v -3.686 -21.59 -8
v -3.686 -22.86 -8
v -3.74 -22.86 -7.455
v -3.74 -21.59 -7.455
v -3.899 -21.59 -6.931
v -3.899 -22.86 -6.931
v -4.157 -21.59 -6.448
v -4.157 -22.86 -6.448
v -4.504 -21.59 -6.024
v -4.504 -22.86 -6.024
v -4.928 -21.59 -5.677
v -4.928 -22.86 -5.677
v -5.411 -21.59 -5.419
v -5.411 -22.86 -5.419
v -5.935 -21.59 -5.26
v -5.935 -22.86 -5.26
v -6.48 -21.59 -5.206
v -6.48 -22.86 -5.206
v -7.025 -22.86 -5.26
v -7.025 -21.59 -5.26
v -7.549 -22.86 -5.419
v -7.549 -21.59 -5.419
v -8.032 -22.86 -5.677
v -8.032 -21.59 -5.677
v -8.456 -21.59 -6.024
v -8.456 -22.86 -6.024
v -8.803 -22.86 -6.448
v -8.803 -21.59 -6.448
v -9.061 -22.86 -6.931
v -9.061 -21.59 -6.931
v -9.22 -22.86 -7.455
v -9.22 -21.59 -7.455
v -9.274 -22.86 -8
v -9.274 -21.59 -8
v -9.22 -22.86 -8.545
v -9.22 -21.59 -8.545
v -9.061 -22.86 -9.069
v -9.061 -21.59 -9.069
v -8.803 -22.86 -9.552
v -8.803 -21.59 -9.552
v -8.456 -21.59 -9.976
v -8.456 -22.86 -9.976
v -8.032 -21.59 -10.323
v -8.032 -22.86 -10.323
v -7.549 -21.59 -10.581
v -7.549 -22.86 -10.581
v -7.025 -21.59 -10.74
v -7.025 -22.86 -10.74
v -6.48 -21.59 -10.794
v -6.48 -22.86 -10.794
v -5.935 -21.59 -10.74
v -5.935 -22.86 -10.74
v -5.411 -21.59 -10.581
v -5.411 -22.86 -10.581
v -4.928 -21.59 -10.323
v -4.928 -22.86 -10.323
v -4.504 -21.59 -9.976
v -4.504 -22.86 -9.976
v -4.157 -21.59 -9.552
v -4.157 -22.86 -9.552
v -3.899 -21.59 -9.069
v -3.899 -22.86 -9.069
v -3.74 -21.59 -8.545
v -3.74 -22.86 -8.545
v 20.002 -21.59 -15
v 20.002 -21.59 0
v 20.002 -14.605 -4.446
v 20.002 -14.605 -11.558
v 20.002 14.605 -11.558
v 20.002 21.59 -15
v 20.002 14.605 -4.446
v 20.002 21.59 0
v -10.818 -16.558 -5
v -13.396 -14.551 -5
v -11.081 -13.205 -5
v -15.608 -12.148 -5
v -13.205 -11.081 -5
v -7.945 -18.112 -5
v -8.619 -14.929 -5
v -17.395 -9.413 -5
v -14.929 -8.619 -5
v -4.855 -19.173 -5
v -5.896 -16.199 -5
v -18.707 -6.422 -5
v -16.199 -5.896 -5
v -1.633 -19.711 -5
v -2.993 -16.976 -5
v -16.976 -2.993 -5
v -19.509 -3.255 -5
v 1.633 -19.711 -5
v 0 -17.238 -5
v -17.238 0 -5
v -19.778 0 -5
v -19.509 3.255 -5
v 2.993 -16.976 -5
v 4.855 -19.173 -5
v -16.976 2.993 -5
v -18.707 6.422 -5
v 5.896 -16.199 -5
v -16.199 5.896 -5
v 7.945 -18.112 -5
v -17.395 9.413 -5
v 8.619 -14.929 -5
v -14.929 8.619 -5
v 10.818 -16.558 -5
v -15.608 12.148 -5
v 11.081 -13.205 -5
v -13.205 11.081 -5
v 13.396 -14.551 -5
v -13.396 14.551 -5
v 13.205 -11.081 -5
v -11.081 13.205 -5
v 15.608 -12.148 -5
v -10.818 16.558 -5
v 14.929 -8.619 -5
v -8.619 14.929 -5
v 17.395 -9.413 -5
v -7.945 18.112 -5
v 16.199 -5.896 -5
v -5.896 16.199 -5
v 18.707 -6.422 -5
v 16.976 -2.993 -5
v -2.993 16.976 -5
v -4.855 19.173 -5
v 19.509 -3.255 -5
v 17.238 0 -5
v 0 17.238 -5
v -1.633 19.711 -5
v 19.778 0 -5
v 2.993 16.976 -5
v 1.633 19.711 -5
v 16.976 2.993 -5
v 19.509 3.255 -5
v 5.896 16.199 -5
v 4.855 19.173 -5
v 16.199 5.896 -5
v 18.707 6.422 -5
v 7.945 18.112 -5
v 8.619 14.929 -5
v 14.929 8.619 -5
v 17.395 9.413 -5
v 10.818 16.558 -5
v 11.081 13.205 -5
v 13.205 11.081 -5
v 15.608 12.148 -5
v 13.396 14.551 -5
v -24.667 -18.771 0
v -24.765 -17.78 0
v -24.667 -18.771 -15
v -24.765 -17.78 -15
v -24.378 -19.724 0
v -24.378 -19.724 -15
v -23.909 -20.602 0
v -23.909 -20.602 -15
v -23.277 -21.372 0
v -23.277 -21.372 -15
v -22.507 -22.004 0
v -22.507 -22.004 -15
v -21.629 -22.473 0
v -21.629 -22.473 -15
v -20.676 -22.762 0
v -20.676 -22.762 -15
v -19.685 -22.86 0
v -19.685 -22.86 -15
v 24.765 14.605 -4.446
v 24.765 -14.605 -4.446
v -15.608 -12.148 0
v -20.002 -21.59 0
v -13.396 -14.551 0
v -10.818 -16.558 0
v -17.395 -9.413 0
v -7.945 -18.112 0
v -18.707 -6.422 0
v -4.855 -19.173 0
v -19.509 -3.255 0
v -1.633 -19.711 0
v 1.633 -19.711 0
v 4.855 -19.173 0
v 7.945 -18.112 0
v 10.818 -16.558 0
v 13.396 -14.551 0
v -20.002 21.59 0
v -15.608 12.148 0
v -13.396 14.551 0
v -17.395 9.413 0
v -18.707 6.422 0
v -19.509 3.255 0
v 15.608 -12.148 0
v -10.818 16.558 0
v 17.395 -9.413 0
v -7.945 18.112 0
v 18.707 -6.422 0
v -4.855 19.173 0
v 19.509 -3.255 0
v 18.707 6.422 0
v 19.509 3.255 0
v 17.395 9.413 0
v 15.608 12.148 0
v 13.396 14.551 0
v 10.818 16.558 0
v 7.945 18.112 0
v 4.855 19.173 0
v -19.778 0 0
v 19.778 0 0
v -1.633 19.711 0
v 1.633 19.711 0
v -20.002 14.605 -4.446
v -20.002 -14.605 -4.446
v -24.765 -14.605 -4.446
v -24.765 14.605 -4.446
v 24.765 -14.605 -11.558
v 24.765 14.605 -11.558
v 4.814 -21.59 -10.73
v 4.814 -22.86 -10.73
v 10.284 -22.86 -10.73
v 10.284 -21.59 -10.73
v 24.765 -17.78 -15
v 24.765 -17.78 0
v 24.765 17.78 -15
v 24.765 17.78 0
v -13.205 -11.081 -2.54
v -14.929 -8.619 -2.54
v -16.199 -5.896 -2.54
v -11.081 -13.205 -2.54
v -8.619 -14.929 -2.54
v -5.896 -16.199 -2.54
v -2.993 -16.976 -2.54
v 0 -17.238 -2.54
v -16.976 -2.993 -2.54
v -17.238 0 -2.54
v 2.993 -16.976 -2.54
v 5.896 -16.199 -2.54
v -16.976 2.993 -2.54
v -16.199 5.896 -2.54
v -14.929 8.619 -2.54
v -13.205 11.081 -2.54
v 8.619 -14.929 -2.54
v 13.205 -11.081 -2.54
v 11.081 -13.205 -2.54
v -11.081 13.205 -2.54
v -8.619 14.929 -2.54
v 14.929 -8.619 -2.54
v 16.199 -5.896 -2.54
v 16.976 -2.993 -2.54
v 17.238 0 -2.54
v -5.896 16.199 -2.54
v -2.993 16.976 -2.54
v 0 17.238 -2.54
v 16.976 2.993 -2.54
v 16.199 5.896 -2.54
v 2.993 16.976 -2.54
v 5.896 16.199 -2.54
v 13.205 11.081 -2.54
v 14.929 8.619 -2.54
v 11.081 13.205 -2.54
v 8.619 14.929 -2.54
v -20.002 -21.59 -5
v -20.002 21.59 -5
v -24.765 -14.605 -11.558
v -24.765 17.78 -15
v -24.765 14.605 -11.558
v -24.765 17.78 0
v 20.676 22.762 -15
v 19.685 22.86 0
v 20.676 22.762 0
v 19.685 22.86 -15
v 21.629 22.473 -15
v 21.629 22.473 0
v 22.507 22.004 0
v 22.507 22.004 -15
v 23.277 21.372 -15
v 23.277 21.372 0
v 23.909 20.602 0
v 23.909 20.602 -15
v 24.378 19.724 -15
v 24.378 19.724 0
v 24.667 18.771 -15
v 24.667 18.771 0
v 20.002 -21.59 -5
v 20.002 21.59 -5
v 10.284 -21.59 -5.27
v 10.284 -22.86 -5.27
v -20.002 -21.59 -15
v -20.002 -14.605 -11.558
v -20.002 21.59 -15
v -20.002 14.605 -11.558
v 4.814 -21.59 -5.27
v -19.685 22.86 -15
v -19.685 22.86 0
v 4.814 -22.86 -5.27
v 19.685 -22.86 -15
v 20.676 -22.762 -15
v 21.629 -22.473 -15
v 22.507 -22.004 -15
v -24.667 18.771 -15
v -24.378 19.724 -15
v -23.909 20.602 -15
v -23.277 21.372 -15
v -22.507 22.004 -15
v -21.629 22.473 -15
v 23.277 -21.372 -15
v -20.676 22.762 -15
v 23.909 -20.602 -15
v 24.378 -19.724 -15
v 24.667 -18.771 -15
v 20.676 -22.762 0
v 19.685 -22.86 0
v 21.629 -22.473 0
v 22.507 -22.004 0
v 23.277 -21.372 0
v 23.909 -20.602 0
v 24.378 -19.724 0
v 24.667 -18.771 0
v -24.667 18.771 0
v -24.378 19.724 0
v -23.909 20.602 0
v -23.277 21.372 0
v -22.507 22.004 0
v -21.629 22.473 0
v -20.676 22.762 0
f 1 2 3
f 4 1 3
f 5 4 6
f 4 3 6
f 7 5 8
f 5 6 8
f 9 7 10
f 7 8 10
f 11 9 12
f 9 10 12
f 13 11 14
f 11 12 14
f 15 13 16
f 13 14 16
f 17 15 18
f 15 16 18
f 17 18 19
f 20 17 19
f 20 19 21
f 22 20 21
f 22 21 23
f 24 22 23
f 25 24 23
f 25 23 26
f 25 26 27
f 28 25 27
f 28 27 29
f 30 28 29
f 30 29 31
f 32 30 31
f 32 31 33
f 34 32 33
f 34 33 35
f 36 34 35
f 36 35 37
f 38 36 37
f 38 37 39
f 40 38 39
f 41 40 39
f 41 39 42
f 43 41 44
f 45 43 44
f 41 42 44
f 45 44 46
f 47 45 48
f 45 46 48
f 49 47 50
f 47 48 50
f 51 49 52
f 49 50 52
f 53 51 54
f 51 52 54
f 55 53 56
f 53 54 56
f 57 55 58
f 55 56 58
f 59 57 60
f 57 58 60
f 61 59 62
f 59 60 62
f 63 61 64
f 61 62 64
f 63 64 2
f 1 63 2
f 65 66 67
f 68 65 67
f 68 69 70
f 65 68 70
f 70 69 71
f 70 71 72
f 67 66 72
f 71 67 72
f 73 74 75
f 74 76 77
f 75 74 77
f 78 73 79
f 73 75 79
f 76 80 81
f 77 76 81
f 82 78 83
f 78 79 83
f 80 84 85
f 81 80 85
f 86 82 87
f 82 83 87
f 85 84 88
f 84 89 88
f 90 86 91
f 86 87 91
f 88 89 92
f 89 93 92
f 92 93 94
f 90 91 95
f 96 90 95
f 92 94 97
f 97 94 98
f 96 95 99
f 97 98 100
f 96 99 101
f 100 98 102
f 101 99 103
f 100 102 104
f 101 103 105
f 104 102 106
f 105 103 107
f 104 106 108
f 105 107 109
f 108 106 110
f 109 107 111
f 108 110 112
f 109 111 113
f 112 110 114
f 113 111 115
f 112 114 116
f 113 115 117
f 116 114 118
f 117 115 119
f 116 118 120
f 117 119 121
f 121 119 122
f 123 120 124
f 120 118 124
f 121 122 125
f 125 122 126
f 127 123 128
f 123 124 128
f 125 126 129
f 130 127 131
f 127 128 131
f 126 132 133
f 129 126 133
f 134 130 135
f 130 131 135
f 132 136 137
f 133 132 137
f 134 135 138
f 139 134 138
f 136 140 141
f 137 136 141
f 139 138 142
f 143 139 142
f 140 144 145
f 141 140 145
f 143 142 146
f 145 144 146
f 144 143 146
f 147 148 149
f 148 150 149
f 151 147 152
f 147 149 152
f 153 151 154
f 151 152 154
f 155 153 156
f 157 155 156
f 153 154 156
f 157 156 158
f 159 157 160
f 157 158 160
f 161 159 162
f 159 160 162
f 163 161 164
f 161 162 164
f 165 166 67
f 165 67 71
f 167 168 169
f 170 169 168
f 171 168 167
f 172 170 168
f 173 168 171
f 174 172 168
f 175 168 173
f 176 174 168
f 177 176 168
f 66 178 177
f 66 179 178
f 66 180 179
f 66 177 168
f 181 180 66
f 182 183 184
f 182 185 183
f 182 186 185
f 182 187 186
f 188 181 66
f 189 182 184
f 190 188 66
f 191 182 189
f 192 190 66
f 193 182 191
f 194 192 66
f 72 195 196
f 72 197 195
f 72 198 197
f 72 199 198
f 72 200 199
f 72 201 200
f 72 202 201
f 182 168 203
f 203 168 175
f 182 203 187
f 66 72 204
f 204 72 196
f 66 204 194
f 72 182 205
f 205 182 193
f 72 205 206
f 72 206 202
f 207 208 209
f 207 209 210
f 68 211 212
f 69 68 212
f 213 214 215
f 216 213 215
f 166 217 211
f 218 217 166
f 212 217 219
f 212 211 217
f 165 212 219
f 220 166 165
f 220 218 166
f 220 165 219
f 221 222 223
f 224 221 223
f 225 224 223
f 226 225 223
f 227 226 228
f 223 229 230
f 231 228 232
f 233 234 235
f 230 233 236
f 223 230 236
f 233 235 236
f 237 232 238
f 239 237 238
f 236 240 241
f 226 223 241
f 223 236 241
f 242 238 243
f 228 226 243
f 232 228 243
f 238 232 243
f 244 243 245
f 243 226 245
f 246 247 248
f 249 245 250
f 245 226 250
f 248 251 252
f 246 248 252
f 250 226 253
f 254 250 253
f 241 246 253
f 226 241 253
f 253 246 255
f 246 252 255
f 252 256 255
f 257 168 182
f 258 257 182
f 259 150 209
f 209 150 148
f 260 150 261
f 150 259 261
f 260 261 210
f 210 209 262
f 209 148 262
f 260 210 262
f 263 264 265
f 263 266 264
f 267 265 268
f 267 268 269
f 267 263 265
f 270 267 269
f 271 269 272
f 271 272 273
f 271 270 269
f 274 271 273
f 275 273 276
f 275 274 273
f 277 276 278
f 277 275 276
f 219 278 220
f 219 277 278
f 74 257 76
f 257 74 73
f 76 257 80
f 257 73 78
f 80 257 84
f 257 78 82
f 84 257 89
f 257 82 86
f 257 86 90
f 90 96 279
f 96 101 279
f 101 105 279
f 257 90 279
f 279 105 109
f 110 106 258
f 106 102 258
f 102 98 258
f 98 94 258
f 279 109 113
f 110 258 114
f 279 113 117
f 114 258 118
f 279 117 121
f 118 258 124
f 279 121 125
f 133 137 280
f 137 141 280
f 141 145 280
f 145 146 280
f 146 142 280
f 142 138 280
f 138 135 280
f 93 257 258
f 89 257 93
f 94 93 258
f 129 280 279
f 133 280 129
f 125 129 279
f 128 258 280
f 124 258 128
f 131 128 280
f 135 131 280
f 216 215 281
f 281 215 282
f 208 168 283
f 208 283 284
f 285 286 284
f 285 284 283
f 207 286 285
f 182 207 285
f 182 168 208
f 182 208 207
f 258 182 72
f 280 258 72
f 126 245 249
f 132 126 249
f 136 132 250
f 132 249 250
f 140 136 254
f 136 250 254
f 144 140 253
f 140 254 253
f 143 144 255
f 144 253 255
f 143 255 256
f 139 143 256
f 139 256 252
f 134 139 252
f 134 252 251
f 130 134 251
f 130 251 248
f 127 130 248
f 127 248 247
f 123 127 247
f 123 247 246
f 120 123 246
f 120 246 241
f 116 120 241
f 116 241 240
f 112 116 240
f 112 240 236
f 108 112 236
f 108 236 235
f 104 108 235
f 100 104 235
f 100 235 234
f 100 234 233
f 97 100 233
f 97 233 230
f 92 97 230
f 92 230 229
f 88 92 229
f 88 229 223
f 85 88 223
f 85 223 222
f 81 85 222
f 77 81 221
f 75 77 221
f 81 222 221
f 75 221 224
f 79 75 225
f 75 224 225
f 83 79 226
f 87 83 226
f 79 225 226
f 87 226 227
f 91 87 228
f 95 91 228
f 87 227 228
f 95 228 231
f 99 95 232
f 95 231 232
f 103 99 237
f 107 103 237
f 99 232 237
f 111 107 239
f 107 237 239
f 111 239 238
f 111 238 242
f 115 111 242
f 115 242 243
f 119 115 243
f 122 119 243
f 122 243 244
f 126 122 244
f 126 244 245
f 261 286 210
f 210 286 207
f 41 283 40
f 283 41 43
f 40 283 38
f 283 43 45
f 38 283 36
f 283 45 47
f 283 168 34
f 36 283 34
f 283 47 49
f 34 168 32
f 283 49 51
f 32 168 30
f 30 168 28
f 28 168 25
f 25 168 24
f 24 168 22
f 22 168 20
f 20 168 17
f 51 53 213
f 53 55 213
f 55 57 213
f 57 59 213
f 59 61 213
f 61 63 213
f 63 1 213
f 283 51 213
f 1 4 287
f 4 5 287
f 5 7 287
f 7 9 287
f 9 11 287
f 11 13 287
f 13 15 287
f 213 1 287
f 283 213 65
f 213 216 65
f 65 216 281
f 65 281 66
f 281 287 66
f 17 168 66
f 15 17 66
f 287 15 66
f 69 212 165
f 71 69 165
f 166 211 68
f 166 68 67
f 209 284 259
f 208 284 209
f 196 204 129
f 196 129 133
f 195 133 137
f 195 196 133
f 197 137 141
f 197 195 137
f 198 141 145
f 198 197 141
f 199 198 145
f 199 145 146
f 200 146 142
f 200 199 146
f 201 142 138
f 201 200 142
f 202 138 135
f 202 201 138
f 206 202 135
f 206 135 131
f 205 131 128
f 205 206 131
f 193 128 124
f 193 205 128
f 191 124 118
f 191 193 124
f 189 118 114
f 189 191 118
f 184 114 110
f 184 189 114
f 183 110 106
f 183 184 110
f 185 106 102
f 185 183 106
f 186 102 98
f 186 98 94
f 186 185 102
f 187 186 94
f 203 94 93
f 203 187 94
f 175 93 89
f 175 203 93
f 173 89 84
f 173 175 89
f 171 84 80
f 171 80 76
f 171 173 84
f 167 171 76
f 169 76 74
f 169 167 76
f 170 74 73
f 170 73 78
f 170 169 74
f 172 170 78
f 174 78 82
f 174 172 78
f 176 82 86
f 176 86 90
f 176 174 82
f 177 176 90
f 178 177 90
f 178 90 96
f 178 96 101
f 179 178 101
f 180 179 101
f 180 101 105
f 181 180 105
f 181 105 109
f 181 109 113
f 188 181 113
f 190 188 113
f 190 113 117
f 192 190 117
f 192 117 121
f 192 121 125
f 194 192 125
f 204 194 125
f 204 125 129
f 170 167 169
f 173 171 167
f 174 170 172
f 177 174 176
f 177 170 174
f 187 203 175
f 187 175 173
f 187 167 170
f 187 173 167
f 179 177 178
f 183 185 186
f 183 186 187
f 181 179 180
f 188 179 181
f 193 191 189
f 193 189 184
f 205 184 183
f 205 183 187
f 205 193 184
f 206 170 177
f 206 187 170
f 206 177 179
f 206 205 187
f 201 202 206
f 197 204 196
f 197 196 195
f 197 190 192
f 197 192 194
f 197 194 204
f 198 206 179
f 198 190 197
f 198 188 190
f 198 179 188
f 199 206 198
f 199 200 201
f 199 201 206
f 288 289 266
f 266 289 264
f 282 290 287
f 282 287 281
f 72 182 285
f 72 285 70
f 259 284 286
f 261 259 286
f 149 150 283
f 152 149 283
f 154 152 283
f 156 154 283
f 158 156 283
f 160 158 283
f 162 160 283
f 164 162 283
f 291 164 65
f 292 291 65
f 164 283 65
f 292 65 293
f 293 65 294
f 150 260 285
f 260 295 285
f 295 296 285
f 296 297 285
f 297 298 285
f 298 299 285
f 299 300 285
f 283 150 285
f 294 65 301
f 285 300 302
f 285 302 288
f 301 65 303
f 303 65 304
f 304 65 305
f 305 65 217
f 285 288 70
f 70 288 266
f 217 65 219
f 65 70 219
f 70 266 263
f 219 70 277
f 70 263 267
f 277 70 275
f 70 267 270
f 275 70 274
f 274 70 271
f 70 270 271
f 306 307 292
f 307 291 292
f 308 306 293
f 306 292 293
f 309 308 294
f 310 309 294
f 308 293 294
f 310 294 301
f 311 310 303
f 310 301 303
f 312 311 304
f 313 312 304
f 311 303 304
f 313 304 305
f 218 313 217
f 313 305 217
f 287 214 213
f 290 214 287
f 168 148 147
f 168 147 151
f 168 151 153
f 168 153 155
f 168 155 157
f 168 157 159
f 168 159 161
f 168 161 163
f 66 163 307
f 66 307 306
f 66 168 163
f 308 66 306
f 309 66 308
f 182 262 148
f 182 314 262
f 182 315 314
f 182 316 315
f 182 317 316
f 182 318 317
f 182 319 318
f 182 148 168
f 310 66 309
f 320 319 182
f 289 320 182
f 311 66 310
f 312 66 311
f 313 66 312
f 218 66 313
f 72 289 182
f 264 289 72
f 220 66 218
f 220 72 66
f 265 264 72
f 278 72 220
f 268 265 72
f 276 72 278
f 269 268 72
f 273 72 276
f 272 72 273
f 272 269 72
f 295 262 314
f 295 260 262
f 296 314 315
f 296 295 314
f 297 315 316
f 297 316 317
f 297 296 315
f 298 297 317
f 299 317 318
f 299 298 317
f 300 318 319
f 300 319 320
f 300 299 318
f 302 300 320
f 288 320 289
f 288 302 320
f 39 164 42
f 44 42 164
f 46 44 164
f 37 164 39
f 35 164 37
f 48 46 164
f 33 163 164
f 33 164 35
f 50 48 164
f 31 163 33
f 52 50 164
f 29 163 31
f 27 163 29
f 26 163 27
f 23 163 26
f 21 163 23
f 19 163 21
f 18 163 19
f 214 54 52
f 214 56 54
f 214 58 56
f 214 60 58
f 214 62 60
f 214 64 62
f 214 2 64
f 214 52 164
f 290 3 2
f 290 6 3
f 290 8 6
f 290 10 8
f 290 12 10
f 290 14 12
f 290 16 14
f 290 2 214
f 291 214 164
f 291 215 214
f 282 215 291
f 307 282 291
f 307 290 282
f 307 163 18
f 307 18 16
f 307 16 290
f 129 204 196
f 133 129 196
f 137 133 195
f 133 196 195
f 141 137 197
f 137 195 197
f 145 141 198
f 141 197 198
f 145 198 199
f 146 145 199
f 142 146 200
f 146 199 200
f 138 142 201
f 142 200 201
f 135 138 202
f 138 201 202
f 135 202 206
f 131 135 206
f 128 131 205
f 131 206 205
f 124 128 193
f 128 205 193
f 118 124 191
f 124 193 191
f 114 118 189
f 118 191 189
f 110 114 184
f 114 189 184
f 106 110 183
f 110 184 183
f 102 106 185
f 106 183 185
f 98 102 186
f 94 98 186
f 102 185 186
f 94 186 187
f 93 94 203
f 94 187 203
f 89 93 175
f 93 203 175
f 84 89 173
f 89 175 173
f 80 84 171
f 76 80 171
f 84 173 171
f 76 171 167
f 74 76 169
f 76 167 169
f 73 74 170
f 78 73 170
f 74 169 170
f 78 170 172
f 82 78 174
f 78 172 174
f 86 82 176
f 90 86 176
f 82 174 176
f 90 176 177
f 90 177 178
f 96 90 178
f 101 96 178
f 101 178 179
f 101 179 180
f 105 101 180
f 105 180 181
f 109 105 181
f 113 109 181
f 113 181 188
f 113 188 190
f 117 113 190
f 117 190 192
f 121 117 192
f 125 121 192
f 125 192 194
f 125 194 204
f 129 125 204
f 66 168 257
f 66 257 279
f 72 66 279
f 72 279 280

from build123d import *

# Parameters (mm, degrees)
F0_W      = 40.005
F0_H      = 43.18
F0_R      = 19.7783597571
F1_DEPTH  = 5
F2_R      = 19.7783597571
F3_DEPTH  = 5
F4_T      = -2.54
F0_W_2    = 49.53
F0_H_2    = 45.72
F5_DEPTH  = 15
F6_R      = 5.08
F7_W      = 5.47
F7_H      = 5.461
F7_R      = 2.794
F8_DEPTH  = 16.891
F9_W      = 29.21
F9_H      = 7.112
F10_DEPTH = 55.626


with BuildPart() as f1:
    # F0 (on Top) → F1 (new body)
    with BuildSketch(Plane.XY):
        Rectangle(F0_W, F0_H)
        Circle(F0_R, mode=Mode.SUBTRACT)
    extrude(amount=-F1_DEPTH)


with BuildPart() as f3:
    # F2 (on Top) → F3 (new body)
    with BuildSketch(Plane.XY):
        Circle(F2_R)
    extrude(amount=-F3_DEPTH)

    # F4
    f4_openings = [f3.faces().sort_by_distance(p)[0] for p in [
        (0, 0, -5),
    ]]
    offset(amount=F4_T, openings=f4_openings)


with BuildPart() as f5:
    # F0 (on Top) → F5 (new body)
    with BuildSketch(Plane.XY):
        Rectangle(F0_W_2, F0_H_2)
        Rectangle(F0_W, F0_H, mode=Mode.SUBTRACT)
    extrude(amount=-F5_DEPTH)

    # F6
    f6_edges = [f5.edges().sort_by_distance(p)[0] for p in [
        (-24.765, -22.86, -7.5),
        (24.765, -22.86, -7.5),
        (24.765, 22.86, -7.5),
        (-24.765, 22.86, -7.5),
    ]]
    fillet(f6_edges, radius=F6_R)

    # F7 (on face) → F8 (cut)
    with BuildSketch(Plane.XZ.offset(22.86)):
        with Locations((7.5489302855, -8)):
            Rectangle(F7_W, F7_H)
        with Locations((-6.4799310854, -8)):
            Circle(F7_R)
    extrude(amount=-F8_DEPTH, mode=Mode.SUBTRACT)

    # F9 (on face) → F10 (cut)
    with BuildSketch(Plane.YZ.offset(24.765)):
        with Locations((0, -8.002400344)):
            Rectangle(F9_W, F9_H)
    extrude(amount=-F10_DEPTH, mode=Mode.SUBTRACT)


solid = Compound([f1.part, f3.part, f5.part])
